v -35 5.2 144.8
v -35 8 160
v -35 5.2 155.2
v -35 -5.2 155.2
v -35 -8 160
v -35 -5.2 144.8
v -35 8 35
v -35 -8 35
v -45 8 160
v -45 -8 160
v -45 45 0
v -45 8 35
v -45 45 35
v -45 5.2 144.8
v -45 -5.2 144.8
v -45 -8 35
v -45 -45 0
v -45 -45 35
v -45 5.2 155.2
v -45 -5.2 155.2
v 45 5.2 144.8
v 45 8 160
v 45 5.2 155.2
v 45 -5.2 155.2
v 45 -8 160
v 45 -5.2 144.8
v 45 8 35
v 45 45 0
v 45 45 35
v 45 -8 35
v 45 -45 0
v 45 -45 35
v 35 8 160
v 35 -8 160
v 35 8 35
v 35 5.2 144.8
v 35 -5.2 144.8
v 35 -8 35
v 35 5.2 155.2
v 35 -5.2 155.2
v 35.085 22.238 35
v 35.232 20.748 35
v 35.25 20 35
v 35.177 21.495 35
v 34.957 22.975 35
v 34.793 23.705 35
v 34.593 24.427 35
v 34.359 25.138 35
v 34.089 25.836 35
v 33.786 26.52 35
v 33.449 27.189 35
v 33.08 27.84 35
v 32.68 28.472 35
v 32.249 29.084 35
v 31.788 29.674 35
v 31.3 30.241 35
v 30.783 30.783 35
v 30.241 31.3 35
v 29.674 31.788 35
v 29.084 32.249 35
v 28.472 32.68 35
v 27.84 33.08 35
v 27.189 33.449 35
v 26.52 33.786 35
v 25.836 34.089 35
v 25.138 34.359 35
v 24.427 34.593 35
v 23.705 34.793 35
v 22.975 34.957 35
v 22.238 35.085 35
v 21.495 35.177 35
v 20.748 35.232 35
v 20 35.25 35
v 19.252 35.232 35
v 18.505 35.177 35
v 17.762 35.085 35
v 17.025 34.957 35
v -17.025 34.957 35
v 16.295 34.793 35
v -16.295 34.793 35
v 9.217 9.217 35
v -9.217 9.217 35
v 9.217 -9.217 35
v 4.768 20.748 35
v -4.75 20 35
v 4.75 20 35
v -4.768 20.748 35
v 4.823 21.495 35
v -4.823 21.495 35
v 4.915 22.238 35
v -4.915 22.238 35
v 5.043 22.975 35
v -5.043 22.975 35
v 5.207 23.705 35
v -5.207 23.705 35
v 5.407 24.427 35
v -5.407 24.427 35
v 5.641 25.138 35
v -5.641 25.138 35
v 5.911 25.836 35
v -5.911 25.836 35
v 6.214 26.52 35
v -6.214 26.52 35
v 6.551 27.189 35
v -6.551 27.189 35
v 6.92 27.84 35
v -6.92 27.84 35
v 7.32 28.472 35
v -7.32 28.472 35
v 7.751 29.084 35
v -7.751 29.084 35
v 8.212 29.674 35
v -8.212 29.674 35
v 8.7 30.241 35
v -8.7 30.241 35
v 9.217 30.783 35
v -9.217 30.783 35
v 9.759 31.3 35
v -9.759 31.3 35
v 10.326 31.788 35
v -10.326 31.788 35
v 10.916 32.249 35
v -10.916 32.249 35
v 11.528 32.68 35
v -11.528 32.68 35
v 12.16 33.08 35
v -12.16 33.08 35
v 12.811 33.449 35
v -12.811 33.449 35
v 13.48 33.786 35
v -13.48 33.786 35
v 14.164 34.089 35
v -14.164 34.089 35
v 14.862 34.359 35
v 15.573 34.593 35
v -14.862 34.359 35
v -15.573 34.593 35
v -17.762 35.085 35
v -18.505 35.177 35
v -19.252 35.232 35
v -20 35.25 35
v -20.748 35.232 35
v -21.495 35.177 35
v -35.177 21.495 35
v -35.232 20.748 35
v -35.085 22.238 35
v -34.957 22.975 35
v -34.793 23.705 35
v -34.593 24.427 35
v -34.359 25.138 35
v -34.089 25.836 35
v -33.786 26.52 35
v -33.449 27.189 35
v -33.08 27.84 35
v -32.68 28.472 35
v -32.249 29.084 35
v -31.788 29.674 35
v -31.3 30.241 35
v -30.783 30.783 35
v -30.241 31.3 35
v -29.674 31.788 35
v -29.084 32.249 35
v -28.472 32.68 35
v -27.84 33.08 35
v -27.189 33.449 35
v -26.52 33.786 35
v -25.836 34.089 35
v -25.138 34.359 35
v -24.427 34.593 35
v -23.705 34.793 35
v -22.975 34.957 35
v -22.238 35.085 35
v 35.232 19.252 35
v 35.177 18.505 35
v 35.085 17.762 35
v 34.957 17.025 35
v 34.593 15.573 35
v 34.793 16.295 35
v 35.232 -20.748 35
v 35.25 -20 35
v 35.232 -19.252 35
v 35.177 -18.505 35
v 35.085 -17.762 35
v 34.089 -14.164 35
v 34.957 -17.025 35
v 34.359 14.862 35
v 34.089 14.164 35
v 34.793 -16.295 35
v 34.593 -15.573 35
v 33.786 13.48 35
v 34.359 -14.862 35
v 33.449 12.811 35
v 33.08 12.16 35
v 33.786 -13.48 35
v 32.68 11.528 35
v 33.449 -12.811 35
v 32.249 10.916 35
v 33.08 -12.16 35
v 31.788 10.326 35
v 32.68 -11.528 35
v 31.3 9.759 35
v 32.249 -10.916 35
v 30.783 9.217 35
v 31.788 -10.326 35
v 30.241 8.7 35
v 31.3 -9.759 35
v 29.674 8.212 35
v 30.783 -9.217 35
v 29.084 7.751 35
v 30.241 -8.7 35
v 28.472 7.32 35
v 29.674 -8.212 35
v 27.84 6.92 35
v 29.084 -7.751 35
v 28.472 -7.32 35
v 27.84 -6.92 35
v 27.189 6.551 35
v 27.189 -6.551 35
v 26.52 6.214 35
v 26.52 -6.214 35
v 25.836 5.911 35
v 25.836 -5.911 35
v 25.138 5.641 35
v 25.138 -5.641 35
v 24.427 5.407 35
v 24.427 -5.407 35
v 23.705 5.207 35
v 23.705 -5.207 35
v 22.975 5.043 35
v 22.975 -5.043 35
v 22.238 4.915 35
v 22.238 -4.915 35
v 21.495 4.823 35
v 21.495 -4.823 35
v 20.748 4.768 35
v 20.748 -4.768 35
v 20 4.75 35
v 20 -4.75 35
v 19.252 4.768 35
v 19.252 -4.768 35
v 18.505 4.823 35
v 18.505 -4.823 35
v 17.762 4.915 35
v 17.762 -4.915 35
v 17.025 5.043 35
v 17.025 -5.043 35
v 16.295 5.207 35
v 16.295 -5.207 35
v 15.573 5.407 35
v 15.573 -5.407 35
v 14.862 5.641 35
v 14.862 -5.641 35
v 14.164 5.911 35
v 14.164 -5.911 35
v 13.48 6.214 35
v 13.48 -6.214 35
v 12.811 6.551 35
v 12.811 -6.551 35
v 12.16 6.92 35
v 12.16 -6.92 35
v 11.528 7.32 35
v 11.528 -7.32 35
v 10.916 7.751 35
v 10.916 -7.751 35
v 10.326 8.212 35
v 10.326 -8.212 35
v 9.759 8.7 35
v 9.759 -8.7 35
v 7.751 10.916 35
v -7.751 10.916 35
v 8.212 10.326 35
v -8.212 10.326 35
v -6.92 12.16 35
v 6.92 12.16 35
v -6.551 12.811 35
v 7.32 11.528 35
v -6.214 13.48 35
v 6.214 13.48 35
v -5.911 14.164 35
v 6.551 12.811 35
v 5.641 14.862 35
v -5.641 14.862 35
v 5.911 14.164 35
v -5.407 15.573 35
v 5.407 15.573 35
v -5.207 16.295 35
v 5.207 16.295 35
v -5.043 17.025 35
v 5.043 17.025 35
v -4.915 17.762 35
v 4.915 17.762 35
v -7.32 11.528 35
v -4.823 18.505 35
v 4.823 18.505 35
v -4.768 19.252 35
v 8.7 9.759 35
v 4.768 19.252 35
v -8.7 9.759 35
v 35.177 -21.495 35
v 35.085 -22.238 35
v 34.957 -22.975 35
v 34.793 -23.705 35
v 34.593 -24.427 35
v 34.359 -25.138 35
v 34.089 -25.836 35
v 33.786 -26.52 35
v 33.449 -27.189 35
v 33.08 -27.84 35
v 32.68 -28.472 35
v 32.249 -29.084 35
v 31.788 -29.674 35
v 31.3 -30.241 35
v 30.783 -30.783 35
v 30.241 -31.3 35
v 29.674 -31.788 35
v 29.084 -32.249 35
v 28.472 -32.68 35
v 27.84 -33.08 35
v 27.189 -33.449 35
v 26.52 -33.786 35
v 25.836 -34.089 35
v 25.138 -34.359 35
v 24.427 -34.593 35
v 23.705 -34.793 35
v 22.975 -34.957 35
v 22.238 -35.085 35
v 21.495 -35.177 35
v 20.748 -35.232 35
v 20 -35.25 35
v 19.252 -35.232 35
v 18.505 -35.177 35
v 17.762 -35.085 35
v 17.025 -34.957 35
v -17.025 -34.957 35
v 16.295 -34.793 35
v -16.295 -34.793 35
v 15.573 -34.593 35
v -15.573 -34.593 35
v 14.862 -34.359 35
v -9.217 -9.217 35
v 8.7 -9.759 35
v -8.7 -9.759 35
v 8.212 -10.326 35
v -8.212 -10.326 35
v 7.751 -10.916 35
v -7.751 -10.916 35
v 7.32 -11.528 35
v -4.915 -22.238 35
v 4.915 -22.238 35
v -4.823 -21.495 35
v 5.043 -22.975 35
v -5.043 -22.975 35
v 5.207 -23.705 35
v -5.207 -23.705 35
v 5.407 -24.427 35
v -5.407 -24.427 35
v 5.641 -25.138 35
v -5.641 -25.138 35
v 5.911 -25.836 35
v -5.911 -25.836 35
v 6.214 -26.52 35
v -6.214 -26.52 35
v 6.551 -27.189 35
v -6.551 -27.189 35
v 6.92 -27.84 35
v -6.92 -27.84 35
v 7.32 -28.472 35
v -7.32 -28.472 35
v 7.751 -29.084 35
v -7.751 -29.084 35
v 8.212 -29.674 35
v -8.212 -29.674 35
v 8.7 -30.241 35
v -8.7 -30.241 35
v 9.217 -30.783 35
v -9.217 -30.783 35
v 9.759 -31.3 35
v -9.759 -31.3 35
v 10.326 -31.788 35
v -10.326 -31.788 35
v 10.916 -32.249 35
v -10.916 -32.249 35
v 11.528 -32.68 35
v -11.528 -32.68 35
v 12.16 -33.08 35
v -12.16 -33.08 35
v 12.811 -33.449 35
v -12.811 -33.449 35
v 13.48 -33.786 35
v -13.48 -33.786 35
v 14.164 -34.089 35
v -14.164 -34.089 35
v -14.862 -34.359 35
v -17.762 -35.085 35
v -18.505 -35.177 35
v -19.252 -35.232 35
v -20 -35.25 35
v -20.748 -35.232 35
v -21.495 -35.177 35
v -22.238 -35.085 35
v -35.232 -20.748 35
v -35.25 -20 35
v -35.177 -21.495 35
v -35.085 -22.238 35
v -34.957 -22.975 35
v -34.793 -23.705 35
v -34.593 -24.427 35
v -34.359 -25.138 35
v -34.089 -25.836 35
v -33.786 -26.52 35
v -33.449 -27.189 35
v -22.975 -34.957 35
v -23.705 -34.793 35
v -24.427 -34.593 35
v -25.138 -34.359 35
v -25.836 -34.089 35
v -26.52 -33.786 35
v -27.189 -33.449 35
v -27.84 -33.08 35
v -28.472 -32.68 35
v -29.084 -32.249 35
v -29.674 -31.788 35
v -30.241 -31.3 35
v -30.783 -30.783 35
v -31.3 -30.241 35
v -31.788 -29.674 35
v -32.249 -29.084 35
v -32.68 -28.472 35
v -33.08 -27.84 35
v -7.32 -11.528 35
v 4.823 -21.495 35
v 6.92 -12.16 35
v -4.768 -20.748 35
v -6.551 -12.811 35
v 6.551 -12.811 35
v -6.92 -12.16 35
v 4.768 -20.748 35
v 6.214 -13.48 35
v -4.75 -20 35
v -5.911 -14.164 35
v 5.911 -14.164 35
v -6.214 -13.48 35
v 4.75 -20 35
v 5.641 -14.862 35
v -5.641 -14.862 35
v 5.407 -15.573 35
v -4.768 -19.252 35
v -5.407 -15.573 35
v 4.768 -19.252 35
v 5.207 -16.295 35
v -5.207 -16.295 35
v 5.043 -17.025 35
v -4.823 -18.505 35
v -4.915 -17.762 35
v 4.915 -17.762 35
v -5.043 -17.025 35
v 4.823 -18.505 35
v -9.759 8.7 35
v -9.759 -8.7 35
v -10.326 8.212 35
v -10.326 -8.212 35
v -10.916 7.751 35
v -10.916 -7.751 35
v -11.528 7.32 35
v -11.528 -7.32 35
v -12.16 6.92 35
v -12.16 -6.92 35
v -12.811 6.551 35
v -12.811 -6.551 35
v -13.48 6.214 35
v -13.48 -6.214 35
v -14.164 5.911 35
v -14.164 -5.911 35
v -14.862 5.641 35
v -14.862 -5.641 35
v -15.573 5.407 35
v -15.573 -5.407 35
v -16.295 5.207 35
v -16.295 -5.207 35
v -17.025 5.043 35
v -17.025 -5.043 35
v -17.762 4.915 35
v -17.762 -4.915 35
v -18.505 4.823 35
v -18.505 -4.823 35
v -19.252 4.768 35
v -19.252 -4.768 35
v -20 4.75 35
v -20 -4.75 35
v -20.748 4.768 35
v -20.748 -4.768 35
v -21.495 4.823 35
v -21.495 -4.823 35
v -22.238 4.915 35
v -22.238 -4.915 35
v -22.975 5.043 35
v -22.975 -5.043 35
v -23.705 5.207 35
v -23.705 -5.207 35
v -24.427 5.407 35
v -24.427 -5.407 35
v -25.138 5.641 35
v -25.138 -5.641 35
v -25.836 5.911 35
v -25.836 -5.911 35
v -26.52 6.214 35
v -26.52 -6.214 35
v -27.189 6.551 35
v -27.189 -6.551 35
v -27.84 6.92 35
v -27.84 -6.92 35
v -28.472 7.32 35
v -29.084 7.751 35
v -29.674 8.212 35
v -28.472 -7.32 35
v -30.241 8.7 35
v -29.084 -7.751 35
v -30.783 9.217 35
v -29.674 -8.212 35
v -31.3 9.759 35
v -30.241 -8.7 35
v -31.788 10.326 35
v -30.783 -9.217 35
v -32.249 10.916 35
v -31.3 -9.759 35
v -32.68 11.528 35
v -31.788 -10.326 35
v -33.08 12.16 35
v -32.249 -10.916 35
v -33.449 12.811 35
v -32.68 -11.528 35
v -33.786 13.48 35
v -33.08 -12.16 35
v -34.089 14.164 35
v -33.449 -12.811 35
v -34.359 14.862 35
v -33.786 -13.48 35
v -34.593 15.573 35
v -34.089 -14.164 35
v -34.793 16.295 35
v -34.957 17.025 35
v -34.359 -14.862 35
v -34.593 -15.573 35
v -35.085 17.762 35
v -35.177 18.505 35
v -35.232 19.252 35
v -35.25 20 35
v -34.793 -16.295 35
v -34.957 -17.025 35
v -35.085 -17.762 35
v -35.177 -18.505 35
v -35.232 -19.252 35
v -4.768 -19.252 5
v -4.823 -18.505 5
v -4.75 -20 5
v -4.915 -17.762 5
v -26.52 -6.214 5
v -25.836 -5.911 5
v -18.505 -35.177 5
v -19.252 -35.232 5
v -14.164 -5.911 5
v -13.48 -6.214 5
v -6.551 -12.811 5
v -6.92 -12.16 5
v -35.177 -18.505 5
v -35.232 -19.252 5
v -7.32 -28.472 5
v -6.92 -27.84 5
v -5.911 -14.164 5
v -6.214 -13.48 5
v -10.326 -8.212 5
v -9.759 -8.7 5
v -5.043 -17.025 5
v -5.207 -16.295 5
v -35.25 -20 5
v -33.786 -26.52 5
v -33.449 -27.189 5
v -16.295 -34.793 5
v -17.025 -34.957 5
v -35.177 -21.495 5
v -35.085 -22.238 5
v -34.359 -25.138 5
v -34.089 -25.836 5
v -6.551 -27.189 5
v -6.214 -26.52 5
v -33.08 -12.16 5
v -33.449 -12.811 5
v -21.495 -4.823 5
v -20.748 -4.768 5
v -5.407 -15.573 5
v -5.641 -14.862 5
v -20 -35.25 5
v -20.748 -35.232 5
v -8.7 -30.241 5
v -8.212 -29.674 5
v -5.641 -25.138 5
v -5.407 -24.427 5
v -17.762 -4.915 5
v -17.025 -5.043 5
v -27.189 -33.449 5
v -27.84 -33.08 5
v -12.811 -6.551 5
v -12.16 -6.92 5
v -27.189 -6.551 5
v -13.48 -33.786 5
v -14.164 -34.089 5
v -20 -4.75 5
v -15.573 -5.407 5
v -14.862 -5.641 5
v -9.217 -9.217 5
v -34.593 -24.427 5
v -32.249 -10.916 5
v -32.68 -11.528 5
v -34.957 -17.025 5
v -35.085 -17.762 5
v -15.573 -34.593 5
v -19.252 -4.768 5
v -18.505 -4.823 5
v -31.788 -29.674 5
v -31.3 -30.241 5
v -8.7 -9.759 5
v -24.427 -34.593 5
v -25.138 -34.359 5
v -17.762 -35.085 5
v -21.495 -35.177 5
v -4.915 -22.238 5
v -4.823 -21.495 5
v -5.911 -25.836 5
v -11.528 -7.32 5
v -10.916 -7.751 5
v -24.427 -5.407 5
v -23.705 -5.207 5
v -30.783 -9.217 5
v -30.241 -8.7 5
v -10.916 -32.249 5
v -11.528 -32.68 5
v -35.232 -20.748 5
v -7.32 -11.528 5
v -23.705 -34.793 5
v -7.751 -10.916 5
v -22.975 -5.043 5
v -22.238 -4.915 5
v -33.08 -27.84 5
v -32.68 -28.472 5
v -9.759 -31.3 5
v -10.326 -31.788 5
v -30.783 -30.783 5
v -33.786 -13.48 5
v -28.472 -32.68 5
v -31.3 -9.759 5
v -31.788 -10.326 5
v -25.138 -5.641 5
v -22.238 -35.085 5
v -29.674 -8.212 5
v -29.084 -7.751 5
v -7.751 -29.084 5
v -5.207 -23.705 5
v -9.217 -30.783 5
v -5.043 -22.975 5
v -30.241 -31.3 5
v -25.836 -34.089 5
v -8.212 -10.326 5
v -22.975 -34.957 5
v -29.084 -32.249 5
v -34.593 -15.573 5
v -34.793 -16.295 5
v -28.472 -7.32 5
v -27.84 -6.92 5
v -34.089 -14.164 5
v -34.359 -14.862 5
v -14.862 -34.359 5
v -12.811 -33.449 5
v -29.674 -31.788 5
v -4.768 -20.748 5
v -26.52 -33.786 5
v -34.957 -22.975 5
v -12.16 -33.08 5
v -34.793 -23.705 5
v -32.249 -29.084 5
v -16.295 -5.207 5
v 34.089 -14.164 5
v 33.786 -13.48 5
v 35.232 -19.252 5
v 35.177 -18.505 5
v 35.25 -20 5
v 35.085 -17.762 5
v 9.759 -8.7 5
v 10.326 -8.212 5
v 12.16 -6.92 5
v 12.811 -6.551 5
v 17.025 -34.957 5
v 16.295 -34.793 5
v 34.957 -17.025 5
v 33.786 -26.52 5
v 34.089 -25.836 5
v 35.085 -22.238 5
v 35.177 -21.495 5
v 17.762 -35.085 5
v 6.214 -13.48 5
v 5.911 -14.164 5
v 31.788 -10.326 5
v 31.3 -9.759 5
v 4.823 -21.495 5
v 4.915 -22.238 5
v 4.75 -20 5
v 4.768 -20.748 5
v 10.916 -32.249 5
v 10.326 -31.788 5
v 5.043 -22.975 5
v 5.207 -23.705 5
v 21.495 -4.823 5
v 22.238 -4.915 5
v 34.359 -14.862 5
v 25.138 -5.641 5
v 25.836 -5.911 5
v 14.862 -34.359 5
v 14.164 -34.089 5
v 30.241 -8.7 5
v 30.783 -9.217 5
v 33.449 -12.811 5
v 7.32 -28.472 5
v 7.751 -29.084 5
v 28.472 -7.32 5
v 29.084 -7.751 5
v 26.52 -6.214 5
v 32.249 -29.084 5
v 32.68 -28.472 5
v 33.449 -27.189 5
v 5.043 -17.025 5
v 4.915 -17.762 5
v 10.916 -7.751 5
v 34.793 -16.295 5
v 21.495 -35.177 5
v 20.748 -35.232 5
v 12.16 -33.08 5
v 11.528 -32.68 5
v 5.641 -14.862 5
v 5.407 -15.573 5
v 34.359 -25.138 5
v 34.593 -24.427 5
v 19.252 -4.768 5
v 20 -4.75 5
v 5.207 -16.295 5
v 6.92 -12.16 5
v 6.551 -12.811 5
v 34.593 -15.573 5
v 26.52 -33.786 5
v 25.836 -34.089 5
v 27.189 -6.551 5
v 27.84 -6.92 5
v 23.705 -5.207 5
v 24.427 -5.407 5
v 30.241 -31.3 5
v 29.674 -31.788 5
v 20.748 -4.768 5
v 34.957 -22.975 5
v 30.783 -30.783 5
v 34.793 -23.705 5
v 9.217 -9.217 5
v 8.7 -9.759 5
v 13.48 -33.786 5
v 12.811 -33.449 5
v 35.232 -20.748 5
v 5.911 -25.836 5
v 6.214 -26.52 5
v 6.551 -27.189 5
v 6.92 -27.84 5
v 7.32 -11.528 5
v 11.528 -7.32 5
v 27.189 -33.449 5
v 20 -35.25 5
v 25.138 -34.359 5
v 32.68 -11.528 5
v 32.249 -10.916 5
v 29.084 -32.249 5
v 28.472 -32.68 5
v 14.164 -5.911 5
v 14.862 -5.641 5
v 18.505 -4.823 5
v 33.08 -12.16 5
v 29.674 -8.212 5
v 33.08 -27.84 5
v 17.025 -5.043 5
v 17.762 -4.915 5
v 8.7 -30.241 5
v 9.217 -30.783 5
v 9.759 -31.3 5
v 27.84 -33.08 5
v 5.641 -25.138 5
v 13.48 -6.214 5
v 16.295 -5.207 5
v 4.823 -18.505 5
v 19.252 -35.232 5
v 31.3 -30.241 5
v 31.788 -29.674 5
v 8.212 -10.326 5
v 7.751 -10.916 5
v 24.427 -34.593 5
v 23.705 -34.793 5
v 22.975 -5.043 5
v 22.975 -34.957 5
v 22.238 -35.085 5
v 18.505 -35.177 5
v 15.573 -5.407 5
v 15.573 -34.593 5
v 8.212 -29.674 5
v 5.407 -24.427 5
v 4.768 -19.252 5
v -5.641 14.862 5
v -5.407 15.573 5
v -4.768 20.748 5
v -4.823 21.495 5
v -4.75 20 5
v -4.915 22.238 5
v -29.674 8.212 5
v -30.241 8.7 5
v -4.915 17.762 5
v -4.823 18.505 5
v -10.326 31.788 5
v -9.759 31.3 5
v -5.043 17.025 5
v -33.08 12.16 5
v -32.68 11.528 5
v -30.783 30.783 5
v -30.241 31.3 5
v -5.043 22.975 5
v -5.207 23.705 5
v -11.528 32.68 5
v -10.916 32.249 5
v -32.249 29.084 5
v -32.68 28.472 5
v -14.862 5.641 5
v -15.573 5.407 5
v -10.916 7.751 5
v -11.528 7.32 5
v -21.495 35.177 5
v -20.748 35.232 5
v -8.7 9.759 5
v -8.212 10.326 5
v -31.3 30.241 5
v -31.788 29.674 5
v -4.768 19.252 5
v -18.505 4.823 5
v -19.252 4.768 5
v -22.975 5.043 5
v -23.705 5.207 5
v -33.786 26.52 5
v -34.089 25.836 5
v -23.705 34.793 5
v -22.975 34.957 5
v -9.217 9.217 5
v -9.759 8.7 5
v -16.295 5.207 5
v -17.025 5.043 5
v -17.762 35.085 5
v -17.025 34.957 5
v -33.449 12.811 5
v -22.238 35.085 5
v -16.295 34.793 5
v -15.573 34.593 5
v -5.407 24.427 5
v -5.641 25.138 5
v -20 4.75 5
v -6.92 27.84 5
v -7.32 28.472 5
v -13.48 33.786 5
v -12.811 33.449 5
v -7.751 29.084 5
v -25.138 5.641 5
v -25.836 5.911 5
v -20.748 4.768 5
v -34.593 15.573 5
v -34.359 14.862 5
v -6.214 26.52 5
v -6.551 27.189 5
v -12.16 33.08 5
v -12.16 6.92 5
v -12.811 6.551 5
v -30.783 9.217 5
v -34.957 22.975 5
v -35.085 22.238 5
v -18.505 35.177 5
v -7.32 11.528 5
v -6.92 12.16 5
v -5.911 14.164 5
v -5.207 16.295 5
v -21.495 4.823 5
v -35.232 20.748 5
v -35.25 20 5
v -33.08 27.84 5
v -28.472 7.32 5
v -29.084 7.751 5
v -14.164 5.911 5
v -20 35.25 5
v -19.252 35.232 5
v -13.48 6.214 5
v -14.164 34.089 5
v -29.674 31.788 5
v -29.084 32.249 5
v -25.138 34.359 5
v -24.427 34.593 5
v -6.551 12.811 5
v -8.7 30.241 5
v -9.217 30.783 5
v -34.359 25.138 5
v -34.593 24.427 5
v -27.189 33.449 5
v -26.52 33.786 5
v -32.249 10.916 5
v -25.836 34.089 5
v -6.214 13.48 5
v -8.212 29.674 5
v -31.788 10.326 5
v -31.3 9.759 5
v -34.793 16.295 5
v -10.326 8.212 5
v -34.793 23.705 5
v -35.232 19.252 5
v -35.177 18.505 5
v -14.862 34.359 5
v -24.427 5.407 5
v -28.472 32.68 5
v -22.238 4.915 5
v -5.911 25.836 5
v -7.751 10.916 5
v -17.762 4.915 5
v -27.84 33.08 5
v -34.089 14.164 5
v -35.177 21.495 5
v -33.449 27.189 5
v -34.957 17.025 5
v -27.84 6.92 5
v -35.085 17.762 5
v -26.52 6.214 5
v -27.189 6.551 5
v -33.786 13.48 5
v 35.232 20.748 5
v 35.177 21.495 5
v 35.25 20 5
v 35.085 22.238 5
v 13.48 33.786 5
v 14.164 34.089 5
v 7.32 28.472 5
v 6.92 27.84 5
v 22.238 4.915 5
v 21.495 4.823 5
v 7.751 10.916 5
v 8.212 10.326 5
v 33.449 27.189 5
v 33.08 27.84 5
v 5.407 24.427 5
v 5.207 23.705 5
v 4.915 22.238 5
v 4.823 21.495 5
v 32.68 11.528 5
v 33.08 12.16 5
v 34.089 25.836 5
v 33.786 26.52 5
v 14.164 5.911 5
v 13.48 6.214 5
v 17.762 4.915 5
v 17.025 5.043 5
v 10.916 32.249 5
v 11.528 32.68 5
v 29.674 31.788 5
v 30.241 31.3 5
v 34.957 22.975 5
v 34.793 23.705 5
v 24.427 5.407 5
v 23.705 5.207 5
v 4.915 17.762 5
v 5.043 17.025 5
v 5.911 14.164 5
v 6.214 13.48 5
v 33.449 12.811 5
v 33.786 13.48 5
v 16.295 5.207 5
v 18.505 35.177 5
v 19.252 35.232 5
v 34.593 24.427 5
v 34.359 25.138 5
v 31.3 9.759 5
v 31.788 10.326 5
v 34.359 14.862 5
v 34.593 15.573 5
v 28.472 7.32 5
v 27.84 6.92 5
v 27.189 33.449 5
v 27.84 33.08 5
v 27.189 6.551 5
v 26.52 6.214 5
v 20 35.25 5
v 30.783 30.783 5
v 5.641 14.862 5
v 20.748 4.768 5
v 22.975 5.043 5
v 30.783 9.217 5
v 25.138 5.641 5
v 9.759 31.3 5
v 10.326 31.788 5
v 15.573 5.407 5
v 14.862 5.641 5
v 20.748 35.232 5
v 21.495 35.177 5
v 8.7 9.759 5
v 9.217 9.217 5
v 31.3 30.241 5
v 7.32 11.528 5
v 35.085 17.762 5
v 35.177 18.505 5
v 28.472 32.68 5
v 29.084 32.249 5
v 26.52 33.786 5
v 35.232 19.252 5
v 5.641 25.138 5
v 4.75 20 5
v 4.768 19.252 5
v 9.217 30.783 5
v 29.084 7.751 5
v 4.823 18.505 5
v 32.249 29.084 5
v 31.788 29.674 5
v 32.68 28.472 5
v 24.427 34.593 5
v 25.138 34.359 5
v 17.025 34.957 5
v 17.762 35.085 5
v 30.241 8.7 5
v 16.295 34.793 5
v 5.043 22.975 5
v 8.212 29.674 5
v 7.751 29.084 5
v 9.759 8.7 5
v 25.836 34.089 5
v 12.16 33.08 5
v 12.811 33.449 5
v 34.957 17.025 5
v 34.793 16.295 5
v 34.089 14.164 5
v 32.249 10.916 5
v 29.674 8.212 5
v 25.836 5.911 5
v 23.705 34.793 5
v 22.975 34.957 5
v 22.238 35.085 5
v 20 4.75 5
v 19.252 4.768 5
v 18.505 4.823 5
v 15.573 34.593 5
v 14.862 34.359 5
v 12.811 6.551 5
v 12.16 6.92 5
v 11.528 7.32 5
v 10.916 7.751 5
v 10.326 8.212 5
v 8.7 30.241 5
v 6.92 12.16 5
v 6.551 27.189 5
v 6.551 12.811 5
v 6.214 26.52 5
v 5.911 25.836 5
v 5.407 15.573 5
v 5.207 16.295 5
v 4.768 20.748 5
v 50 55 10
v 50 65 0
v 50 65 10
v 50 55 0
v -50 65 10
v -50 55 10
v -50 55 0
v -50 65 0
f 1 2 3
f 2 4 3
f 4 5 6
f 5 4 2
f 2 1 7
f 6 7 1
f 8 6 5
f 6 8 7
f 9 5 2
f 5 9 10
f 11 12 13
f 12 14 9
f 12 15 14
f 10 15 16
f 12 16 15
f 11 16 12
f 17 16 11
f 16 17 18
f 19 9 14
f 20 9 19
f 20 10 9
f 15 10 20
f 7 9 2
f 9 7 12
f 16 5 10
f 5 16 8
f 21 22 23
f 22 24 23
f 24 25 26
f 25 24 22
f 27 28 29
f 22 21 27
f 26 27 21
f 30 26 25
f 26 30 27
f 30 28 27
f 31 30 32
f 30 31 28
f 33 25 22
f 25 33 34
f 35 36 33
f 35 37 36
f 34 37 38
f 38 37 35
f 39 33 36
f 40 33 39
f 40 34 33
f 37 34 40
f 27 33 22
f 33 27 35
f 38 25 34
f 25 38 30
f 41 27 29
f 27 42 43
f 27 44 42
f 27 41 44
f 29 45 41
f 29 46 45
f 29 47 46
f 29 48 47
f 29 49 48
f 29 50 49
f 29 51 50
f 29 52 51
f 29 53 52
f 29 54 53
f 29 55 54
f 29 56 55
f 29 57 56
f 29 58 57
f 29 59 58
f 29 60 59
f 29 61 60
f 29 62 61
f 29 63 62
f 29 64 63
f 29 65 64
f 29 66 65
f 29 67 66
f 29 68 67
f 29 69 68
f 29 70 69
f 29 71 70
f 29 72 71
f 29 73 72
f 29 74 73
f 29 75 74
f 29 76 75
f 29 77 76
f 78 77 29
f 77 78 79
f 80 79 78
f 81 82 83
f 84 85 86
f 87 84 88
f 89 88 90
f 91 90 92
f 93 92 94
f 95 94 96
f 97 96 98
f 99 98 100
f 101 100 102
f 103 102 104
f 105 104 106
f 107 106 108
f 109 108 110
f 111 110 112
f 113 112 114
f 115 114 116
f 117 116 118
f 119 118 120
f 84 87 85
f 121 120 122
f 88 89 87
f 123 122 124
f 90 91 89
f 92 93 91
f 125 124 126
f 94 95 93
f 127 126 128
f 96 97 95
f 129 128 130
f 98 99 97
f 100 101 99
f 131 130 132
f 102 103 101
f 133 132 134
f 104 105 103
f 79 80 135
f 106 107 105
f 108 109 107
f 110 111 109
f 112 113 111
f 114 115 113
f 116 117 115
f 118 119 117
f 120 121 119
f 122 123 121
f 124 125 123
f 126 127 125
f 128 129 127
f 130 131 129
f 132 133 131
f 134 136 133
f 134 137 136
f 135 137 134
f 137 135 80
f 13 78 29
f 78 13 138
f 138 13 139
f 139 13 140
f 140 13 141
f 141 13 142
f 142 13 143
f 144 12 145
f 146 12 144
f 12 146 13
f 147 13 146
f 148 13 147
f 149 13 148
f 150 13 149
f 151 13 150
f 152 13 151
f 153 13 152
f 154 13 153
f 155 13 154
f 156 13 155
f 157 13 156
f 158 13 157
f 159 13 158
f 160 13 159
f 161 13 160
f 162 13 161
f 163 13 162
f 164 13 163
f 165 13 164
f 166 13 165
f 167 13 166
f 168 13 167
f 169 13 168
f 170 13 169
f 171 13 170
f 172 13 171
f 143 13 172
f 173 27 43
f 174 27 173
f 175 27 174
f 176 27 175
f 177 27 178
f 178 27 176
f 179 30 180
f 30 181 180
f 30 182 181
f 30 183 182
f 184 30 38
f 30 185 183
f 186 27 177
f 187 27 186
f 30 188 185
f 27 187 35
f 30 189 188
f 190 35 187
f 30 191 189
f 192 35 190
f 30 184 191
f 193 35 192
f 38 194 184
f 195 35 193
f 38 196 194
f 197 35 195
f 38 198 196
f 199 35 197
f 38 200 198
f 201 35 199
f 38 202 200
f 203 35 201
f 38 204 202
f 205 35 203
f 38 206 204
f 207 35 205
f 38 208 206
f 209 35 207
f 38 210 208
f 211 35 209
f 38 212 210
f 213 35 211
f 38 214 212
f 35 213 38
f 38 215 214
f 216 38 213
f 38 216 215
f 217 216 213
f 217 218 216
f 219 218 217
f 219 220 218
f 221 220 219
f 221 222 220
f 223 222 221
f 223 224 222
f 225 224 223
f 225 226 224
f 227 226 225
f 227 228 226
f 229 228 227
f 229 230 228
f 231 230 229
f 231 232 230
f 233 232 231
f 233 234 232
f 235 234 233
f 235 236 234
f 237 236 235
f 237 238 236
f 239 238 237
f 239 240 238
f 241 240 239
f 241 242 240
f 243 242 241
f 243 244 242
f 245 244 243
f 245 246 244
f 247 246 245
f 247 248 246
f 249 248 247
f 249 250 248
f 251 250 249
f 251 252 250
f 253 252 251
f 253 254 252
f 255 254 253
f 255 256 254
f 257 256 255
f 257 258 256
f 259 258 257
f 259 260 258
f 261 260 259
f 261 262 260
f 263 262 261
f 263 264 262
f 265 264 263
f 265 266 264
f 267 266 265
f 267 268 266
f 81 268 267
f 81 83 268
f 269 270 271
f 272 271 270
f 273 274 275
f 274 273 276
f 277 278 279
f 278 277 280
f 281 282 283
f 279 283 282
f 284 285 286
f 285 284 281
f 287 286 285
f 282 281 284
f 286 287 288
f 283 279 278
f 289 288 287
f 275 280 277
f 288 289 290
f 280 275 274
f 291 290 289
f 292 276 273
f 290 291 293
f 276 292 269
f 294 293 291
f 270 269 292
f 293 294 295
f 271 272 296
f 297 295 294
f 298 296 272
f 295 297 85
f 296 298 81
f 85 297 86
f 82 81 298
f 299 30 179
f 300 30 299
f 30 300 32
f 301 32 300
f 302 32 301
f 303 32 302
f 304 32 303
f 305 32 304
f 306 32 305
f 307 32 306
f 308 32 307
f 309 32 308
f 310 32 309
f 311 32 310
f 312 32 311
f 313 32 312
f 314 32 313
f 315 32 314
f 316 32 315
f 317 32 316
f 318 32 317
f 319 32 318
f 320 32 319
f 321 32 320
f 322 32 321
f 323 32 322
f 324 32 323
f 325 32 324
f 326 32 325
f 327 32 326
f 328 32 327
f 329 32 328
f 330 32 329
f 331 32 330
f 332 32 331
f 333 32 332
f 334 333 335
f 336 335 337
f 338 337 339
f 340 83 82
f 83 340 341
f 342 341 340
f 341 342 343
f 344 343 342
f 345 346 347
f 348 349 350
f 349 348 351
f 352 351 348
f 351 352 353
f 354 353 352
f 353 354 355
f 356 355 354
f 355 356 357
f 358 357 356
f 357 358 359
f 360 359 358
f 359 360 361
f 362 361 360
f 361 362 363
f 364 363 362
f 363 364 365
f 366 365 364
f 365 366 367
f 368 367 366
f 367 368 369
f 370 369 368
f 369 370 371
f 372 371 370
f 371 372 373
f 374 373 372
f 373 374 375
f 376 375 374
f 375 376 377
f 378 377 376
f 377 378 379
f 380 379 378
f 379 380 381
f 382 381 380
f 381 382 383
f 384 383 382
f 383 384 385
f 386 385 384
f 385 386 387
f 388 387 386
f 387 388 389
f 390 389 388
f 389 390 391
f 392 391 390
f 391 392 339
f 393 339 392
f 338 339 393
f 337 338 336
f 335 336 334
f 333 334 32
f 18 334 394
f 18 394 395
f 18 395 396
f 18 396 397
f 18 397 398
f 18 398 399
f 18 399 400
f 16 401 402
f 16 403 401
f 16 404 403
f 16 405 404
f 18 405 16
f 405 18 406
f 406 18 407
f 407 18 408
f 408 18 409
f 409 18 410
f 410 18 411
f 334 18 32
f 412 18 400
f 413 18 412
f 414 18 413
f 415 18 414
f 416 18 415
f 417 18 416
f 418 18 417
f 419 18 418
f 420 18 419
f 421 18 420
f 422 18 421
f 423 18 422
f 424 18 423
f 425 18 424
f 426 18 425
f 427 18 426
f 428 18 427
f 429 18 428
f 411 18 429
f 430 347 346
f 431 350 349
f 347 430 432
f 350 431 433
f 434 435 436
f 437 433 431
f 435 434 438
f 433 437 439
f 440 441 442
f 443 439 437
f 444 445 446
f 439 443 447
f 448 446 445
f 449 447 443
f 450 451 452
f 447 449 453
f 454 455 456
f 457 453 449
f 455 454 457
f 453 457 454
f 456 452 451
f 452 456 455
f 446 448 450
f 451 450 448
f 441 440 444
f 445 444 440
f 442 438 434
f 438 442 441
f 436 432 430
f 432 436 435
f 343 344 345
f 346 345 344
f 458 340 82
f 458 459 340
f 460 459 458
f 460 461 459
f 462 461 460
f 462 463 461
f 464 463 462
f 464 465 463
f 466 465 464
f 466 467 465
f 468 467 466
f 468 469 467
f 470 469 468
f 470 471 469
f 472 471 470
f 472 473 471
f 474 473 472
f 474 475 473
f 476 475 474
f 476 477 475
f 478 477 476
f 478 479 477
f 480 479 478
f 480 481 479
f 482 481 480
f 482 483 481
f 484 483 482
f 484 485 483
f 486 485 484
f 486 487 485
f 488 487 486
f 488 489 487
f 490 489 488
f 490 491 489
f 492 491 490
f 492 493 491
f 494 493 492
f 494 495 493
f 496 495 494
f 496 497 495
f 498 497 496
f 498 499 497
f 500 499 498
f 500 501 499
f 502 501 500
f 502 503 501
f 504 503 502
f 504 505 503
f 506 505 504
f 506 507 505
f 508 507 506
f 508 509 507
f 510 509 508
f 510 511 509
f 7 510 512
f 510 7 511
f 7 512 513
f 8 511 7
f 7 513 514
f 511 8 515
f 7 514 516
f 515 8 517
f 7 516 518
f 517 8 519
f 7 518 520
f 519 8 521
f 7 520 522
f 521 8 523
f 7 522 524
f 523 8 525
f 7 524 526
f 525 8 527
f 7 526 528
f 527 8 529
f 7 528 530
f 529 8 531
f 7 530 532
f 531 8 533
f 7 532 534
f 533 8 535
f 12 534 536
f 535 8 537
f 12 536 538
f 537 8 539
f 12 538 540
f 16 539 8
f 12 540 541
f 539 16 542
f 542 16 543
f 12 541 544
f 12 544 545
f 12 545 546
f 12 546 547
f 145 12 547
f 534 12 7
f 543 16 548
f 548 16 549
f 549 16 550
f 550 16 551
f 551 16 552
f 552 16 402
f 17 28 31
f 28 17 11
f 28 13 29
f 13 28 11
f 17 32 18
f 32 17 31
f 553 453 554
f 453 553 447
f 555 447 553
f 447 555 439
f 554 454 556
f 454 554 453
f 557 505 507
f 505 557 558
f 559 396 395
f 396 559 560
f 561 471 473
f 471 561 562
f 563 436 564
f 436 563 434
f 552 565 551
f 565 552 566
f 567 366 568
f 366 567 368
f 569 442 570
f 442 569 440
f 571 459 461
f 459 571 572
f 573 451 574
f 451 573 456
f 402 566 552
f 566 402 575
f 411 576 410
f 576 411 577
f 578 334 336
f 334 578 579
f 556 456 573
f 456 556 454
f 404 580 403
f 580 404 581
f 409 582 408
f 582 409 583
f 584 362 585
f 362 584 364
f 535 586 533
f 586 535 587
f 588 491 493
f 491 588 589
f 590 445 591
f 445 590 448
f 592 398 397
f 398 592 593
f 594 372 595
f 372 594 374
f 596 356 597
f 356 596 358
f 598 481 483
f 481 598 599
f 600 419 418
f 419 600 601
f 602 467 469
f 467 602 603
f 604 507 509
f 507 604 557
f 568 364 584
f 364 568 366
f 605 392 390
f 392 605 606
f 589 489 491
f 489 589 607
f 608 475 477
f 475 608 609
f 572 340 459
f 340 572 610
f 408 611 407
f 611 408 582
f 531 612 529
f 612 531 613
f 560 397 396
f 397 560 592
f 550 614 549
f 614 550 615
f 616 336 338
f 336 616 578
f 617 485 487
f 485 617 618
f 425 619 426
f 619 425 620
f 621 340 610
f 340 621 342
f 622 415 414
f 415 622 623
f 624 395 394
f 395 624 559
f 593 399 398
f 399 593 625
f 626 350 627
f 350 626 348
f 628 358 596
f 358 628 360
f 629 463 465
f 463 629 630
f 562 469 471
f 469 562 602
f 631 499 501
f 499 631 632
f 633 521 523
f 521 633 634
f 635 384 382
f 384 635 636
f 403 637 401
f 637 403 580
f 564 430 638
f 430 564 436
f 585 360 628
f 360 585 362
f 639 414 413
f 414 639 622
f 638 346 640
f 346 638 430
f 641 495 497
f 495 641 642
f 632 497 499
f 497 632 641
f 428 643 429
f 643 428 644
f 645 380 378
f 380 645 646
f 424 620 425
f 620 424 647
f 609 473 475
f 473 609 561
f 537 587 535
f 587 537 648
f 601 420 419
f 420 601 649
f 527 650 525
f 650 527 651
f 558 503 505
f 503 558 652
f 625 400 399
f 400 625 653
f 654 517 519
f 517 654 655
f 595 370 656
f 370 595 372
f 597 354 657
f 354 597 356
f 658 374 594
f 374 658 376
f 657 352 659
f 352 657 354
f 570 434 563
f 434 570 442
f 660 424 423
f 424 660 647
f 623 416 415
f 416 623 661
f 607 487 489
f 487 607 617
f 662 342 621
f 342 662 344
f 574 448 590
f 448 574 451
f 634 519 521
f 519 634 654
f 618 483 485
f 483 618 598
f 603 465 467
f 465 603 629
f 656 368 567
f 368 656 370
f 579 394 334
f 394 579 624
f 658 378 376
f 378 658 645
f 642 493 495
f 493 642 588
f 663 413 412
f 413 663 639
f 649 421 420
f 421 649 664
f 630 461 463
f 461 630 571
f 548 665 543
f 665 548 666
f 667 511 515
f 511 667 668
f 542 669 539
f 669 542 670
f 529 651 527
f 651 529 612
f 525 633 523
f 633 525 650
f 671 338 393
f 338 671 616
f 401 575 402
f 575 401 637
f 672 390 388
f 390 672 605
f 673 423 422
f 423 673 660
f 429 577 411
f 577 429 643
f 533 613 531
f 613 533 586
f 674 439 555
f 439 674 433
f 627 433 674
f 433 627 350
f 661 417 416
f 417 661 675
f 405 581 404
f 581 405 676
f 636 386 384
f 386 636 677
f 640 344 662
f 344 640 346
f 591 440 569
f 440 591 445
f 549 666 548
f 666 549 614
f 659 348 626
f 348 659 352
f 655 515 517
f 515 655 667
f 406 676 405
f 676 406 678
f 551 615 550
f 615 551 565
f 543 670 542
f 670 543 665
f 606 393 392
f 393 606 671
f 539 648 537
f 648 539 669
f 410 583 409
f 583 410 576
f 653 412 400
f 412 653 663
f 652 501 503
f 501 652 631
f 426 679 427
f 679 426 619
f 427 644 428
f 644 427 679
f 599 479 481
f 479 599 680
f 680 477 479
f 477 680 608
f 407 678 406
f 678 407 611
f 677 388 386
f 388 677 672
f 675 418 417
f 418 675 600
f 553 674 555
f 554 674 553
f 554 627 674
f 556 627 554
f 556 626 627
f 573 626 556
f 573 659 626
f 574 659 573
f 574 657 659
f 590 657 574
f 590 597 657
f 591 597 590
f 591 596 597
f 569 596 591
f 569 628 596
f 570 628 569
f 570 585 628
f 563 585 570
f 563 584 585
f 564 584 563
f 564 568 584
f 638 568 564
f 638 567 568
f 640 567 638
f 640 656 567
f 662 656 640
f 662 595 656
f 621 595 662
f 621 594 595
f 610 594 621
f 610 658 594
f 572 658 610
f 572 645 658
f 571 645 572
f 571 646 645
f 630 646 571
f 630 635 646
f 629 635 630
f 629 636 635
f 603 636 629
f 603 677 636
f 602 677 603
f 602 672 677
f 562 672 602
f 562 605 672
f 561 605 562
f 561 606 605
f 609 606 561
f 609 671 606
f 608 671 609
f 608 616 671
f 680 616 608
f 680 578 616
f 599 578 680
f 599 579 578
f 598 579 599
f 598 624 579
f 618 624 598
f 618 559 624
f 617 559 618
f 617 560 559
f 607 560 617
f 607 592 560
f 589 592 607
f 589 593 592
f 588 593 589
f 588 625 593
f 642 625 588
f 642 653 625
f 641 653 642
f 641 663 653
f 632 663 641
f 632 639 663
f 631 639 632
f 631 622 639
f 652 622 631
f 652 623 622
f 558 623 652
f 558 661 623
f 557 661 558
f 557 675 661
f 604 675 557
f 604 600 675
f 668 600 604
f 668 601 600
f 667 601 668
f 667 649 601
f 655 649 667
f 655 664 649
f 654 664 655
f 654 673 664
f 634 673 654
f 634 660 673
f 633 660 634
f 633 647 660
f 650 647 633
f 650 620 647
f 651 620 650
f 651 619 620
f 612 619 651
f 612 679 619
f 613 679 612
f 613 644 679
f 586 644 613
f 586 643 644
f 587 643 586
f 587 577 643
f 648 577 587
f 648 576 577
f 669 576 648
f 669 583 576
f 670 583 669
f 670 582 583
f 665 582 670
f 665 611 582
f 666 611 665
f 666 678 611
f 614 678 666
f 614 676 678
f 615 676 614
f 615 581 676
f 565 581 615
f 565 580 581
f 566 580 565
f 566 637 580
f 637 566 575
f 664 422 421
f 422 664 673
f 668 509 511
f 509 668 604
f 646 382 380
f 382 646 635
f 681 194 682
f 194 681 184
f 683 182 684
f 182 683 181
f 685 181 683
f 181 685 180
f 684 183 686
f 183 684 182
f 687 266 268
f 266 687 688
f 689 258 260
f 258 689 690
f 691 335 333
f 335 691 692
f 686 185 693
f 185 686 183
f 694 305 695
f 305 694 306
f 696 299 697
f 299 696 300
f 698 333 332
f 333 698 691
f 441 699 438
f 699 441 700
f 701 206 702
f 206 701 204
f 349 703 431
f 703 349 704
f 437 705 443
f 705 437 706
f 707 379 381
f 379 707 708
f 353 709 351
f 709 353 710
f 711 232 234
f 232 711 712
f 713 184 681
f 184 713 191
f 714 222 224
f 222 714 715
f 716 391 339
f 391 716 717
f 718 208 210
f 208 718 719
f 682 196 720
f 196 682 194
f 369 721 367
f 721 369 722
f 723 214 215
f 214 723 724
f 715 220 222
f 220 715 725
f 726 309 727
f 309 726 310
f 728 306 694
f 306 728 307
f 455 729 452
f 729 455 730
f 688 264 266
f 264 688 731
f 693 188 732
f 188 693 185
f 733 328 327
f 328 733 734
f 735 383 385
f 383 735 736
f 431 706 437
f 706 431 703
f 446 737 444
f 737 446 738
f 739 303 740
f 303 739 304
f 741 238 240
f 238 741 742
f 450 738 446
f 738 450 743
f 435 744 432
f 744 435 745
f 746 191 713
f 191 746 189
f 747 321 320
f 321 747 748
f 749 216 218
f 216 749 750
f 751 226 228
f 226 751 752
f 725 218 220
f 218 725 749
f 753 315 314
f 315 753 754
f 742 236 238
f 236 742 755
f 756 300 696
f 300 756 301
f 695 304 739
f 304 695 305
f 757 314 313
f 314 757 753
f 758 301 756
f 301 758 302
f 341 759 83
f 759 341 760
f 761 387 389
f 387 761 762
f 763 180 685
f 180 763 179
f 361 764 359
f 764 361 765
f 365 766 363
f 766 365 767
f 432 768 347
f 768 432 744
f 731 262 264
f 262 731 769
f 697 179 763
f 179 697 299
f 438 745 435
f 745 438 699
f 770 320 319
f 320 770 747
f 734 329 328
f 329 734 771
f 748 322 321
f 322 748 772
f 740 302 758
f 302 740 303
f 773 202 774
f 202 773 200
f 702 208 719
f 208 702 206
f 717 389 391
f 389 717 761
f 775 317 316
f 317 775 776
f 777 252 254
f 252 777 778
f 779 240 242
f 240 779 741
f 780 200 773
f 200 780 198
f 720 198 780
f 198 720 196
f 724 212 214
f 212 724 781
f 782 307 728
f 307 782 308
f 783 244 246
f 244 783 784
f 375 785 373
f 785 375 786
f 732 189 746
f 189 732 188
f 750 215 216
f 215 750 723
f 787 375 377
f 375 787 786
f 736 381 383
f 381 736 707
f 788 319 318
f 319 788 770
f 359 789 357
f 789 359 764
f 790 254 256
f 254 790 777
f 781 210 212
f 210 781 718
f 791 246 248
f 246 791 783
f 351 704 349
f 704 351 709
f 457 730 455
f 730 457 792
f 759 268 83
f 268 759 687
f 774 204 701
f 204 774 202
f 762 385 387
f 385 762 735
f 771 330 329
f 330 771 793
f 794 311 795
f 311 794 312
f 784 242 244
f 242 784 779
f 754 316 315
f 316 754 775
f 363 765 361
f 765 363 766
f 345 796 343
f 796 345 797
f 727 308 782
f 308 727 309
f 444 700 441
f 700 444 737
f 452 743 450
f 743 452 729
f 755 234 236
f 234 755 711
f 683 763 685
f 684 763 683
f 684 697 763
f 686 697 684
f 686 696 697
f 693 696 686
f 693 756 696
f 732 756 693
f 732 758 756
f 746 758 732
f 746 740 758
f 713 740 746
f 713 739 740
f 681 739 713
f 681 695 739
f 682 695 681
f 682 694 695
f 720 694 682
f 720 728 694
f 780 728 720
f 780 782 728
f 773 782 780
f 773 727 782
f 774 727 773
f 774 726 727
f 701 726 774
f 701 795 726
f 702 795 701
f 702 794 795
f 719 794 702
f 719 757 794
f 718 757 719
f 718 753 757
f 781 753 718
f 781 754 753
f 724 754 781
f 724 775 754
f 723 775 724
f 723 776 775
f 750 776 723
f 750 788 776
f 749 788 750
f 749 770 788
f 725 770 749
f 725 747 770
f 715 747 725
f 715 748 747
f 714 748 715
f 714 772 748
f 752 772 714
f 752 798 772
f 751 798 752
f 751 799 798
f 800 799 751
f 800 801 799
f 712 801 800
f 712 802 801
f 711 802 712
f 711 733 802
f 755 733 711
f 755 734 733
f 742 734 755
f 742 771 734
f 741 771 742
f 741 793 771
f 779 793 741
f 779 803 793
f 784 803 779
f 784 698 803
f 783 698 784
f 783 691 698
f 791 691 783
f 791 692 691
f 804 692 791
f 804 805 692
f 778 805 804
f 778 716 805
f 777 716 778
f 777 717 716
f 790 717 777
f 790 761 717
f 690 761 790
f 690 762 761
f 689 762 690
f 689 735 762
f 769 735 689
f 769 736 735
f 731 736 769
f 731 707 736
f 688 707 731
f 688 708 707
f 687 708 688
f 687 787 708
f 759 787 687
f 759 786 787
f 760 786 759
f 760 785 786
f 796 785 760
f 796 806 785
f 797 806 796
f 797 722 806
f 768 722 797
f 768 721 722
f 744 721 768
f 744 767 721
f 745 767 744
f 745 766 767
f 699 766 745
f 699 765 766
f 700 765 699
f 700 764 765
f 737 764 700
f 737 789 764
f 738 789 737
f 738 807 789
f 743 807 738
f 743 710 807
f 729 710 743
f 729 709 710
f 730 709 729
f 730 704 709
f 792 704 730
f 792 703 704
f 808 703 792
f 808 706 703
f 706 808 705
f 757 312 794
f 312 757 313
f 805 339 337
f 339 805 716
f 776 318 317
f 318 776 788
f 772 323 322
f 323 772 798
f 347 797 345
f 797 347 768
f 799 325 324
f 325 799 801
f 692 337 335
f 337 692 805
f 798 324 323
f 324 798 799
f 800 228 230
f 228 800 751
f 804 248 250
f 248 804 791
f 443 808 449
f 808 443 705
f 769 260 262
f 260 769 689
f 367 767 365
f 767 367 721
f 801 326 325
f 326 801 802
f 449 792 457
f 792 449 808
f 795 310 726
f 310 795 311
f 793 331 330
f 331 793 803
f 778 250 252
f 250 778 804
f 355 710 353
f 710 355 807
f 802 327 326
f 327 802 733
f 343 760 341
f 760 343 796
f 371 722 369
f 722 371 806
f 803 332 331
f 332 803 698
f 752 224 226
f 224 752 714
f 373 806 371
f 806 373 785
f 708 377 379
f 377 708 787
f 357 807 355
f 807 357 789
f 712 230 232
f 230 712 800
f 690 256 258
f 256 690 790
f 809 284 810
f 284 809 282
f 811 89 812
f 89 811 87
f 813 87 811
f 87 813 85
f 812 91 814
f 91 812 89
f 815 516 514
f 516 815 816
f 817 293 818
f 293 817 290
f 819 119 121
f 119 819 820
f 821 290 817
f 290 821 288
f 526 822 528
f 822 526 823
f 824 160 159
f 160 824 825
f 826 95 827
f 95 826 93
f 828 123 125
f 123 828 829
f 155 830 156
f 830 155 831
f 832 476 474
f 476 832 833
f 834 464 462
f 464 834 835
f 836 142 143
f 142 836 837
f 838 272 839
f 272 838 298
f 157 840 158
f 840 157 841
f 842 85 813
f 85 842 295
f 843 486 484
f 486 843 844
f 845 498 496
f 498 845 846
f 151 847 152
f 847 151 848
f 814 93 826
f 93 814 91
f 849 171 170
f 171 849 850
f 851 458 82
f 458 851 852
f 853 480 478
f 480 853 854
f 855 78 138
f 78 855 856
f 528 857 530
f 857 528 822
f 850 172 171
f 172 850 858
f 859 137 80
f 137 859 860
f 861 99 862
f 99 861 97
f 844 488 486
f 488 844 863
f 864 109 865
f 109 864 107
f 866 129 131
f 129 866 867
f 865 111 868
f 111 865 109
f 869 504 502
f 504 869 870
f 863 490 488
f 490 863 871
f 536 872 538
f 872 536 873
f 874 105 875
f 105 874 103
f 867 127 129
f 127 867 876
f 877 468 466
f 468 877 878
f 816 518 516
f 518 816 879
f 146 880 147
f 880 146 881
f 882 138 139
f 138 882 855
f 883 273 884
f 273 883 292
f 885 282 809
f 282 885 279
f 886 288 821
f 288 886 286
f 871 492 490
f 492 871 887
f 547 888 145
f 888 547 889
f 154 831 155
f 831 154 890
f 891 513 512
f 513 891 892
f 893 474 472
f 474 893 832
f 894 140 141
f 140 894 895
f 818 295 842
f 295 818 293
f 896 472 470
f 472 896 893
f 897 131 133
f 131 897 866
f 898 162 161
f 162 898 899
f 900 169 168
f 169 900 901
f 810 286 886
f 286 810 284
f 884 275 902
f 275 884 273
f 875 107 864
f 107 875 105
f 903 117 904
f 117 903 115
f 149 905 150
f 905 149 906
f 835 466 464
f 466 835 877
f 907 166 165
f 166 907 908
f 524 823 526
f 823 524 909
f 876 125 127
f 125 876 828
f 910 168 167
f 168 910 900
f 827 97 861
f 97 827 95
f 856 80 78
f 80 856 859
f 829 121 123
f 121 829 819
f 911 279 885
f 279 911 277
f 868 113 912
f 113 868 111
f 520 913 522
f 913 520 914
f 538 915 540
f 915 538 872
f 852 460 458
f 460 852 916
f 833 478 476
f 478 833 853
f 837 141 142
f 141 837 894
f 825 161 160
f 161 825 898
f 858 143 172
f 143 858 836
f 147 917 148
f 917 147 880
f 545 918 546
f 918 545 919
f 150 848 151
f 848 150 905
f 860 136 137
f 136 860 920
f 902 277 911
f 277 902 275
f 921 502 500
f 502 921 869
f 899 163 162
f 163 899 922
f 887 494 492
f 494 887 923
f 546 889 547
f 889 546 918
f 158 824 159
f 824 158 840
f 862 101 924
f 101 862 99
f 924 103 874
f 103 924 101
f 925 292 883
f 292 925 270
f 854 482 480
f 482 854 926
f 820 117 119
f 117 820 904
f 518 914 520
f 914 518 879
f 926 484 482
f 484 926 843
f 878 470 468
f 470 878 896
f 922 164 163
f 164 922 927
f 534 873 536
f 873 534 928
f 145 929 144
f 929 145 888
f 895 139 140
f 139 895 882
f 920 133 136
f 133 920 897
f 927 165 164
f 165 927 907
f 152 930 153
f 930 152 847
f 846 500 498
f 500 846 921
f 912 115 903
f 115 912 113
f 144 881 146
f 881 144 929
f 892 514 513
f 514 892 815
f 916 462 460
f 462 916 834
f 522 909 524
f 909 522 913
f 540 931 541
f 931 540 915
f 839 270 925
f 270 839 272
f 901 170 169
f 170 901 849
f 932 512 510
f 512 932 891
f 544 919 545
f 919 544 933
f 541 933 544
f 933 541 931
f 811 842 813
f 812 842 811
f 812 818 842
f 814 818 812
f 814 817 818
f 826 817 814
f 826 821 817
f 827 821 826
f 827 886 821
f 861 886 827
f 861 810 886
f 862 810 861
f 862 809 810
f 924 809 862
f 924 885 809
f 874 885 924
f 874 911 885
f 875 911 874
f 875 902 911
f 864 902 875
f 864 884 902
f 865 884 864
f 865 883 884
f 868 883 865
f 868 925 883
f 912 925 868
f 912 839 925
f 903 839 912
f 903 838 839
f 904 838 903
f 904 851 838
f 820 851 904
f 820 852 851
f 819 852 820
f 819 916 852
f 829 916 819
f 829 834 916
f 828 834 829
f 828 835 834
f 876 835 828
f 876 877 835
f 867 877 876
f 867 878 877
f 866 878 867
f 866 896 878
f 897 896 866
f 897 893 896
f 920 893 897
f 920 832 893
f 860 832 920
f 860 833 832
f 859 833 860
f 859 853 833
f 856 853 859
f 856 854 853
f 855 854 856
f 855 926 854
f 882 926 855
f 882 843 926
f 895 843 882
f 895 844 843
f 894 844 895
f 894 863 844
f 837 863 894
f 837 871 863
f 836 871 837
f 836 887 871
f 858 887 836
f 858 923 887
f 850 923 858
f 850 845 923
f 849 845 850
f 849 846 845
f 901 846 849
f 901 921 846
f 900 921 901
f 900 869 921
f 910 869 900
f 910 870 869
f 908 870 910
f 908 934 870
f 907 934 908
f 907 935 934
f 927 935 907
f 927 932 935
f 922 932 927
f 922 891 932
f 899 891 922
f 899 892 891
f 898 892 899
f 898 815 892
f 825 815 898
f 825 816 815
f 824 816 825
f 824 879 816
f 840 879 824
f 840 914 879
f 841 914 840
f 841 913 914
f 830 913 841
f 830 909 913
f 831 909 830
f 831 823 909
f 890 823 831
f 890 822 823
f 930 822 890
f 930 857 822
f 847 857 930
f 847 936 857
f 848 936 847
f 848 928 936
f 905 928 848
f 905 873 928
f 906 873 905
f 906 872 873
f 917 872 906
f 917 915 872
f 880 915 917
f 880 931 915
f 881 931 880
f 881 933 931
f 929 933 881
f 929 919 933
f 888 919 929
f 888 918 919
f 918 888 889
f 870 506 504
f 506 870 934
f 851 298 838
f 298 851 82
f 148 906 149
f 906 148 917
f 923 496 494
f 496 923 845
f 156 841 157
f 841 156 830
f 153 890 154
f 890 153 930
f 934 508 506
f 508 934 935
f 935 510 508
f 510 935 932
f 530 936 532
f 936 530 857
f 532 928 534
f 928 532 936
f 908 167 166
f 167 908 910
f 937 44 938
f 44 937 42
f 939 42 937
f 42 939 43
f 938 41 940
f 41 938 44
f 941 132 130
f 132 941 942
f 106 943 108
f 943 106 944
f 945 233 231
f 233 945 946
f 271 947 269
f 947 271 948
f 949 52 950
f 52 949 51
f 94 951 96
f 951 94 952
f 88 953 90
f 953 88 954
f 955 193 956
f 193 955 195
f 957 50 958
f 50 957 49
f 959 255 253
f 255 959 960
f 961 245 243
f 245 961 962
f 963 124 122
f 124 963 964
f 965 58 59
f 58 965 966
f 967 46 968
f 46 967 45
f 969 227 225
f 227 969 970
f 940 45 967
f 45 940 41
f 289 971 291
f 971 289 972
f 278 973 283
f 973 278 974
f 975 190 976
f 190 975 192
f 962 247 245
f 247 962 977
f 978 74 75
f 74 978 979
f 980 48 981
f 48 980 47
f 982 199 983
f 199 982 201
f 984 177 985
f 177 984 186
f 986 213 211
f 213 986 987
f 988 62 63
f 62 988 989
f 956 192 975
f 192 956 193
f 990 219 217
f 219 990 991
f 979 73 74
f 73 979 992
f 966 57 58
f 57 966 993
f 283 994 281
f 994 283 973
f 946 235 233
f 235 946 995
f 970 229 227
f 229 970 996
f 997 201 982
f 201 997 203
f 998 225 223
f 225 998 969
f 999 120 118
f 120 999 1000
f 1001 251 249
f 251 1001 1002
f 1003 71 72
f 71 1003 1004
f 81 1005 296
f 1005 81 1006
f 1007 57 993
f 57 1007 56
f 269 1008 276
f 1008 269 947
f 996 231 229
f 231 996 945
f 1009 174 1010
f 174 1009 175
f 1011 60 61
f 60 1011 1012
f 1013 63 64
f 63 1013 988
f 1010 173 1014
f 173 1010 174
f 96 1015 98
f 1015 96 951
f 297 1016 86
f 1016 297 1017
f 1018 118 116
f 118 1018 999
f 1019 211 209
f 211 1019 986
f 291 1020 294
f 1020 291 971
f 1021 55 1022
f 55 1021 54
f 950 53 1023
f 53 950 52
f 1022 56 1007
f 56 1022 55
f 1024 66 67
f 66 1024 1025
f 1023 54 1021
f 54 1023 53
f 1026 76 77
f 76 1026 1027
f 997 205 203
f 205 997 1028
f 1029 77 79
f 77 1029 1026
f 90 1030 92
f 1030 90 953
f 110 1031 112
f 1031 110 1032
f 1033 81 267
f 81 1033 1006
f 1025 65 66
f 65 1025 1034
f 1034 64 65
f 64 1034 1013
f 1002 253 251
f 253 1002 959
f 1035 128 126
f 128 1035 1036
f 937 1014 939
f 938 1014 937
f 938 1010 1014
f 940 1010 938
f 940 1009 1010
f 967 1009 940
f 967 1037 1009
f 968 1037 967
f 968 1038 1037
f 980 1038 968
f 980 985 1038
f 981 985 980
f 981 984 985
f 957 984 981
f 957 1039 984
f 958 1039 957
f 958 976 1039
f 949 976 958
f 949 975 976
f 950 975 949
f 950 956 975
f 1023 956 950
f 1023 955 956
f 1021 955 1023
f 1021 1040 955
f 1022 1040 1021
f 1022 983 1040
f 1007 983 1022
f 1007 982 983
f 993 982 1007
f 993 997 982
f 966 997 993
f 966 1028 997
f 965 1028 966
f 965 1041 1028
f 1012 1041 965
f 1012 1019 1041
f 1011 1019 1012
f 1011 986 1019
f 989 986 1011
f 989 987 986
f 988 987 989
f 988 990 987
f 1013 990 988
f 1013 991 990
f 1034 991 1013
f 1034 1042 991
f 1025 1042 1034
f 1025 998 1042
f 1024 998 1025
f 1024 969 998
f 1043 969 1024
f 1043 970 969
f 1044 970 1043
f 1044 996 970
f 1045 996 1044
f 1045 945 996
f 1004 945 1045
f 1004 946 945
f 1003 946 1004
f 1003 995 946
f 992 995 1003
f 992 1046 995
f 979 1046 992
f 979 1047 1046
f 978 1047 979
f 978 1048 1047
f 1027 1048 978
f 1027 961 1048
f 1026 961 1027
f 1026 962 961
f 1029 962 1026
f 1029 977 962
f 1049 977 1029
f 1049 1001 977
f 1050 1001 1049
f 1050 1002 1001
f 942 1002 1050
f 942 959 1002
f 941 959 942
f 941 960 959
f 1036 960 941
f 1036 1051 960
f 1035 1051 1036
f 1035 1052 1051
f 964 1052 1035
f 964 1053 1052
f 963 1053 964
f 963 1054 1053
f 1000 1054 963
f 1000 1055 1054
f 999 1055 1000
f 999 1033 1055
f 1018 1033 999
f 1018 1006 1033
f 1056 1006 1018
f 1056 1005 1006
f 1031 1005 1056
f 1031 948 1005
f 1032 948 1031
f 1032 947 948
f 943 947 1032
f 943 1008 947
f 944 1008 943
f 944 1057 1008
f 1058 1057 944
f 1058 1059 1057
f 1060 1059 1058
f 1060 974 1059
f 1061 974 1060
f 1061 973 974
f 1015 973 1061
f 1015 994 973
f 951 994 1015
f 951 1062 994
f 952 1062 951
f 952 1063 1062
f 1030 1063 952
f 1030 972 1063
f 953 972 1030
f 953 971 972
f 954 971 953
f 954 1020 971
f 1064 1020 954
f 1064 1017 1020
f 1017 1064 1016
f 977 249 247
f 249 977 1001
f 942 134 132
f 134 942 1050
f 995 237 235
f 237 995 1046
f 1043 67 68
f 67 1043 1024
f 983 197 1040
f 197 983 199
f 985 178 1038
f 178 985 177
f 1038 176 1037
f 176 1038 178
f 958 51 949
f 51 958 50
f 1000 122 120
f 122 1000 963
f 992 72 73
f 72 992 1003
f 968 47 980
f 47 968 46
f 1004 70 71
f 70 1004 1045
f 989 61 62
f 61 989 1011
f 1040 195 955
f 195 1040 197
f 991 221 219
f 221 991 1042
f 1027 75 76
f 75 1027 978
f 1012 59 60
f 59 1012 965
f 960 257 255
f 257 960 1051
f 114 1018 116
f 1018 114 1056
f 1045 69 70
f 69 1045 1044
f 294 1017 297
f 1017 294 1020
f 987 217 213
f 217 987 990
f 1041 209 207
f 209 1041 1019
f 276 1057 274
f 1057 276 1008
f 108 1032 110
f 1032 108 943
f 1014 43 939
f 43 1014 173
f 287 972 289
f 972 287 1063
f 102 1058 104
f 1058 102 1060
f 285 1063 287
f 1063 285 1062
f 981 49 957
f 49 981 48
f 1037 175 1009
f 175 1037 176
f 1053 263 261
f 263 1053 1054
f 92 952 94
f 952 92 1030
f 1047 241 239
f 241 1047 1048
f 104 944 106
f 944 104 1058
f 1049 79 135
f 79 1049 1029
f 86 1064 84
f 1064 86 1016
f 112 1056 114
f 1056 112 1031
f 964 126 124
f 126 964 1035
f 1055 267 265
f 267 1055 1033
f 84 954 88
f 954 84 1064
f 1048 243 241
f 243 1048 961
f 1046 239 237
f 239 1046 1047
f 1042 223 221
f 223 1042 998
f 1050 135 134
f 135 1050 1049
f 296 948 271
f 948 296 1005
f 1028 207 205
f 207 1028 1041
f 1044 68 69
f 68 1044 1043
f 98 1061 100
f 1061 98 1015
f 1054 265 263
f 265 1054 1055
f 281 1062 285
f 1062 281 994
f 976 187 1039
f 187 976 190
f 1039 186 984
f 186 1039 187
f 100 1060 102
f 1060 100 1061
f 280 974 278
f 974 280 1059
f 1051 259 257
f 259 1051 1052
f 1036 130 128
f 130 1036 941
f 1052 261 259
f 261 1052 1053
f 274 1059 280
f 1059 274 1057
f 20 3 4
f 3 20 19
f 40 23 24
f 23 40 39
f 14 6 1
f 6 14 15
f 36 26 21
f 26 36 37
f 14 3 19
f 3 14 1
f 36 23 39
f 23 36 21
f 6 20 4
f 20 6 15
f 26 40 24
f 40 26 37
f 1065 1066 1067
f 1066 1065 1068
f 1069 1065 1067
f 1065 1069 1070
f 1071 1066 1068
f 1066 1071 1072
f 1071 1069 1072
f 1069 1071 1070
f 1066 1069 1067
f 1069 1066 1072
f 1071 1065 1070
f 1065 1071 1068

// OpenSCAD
// KNOWN-WRONG PART (must fail): the seats are centred at x = +-20, y = +-20 instead of +-21, +-24
// Carrier for four 50 mL conical tubes with a carrying handle; two parts printed side by side
// Category: hardware. Part 1: a base block with four blind seats and two posts with square holes
// near the top. Part 2: a square handle bar, printed lying flat, pushed through both posts.
// Print: PETG, 0.2 mm layers, 4 perimeters; the posts are tall, so print slowly near the top.
// A drop of glue (or a tight fit) keeps the bar in place.
// SPDX-License-Identifier: CERN-OHL-P-2.0

/* [Carrier] */
base = [90, 90, 35];      // X, Y, Z [mm], centred on the origin
seat_d = 30.5;            // 50 mL conical tube is ~29-30 mm across
seat_depth = 30;          // 5 mm floor
seat_pos = [[-20, -20], [20, -20], [-20, 20], [20, 20]];
post = [10, 16];          // post X, Y; flush with the X end faces, centred on y = 0
post_top = 160;
hole = 10.4;              // square hole along X for the handle bar
hole_z = 150;
bar = [100, 10, 10];      // handle bar X, Y, Z
bar_gap = 10;             // gap between the bar and the base's +Y face

/* [Hidden] */
eps = 0.01;

// part 1: carrier
difference() {
    union() {
        translate([-base.x / 2, -base.y / 2, 0]) cube(base);
        for (s = [-1, 1])
            translate([s > 0 ? base.x / 2 - post.x : -base.x / 2, -post.y / 2, base.z - eps])
                cube([post.x, post.y, post_top - base.z + eps]);
    }
    for (p = seat_pos)
        translate([p.x, p.y, base.z - seat_depth]) cylinder(d = seat_d, h = seat_depth + 1, $fn = 128);
    translate([-base.x / 2 - 1, -hole / 2, hole_z - hole / 2]) cube([base.x + 2, hole, hole]);
}
// part 2: handle bar, beside the base on the +Y side
translate([-bar.x / 2, base.y / 2 + bar_gap, 0]) cube(bar);
